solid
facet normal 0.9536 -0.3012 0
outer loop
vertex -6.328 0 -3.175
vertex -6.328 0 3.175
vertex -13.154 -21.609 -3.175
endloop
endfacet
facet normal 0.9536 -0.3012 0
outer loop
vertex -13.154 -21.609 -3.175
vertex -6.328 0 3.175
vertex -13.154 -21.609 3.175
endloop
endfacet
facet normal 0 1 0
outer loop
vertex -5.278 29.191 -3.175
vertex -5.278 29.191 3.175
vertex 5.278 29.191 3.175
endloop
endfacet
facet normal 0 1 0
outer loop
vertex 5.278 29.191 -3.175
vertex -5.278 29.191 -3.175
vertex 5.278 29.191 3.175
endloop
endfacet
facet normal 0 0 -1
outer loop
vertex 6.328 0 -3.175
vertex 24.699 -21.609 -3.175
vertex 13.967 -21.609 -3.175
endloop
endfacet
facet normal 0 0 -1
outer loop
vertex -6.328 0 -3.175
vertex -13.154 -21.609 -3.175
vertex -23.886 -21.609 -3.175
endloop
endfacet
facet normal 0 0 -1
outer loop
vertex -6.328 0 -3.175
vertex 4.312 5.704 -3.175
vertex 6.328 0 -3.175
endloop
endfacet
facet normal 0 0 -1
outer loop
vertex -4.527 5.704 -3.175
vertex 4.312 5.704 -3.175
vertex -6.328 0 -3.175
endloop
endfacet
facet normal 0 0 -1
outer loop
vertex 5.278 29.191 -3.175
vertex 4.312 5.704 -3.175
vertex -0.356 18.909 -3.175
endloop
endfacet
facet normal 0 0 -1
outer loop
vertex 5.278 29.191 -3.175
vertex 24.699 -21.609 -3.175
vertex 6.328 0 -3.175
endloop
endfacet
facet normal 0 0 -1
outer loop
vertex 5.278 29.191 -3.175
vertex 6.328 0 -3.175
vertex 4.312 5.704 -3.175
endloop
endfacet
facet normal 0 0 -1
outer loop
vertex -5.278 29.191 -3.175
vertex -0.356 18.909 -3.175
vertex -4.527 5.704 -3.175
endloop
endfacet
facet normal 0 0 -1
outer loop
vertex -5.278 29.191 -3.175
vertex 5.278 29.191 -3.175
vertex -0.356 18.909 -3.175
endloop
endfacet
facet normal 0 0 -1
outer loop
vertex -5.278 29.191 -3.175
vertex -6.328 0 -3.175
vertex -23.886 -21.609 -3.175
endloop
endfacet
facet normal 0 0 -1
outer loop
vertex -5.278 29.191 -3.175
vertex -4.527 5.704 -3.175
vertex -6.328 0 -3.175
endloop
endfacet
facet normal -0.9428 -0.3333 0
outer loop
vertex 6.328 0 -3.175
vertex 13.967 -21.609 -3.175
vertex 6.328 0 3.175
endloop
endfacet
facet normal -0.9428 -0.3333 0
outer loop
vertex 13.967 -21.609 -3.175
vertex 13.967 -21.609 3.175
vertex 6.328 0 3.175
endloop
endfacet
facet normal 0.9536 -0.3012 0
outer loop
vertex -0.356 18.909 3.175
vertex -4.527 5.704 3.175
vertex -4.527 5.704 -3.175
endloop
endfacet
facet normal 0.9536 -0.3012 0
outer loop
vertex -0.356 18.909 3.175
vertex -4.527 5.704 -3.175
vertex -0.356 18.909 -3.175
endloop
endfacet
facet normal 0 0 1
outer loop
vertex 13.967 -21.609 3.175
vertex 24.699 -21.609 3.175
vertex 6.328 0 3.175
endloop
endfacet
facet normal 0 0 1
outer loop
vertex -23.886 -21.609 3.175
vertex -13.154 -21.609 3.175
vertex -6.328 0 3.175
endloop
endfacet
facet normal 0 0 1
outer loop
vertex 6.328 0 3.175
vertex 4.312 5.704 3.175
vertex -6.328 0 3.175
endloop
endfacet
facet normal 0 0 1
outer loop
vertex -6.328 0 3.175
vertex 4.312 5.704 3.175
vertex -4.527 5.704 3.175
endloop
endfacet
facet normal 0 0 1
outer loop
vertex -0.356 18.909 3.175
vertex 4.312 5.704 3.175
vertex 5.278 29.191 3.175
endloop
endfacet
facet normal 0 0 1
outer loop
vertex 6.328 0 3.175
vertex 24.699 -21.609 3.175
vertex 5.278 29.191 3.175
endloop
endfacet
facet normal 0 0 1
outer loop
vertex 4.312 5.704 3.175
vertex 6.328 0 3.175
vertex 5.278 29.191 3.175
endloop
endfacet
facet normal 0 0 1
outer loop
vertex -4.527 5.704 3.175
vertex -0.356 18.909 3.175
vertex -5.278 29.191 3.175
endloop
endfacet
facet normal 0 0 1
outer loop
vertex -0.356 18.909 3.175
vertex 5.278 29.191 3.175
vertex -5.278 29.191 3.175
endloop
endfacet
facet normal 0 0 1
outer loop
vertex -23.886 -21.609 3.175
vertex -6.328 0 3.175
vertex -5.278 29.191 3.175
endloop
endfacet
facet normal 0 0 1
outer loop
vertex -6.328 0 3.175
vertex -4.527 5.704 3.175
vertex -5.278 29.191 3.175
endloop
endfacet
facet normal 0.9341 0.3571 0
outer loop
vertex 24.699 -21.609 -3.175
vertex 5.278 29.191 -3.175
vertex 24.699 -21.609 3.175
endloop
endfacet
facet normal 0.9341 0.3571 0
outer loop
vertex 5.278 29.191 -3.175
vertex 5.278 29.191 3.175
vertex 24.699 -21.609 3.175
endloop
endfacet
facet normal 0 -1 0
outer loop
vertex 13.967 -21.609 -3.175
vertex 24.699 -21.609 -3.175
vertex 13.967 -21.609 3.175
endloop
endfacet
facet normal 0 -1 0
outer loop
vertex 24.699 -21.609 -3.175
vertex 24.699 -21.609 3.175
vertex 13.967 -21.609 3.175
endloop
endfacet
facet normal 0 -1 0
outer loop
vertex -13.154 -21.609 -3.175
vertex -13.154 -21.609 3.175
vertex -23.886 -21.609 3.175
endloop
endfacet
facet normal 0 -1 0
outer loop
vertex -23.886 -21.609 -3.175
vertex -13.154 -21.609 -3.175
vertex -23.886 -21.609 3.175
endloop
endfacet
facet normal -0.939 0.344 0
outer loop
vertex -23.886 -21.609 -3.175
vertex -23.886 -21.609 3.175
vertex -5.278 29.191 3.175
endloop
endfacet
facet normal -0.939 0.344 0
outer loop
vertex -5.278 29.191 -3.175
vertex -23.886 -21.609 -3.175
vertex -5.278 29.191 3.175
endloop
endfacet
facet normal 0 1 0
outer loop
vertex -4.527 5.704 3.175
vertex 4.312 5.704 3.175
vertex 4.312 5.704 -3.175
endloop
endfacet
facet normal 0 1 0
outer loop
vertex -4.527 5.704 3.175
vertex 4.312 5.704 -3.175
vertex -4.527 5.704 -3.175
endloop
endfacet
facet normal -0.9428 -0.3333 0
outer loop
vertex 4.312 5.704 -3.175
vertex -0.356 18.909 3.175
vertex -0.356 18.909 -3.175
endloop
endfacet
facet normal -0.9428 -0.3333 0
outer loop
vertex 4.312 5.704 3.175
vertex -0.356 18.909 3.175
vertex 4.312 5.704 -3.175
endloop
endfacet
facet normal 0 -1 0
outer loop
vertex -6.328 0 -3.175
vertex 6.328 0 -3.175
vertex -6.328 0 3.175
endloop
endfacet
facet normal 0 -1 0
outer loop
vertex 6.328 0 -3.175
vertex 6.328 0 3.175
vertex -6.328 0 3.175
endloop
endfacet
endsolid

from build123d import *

# Parameters (mm, degrees)
BOSS_EXTRUDE1_DEPTH = 3.175


with BuildPart() as part:
    # Sketch1 → Boss-Extrude1 (new body, symmetric)
    with BuildSketch(Plane.XY):
        Polygon((-5.278441348, 29.190879636), (5.278441348, 29.190879636), (24.698908797, -21.609120364), (13.966676058, -21.609120364), (6.328370689, 0), (-6.328370689, 0), (-13.154027538, -21.609120364), (-23.886260277, -21.609120364), align=None)
        Polygon((-0.355555483, 18.909137327), (4.312269234, 5.703644579), (-4.526764699, 5.703644579), align=None, mode=Mode.SUBTRACT)
    extrude(amount=BOSS_EXTRUDE1_DEPTH, both=True)


solid = part.part
